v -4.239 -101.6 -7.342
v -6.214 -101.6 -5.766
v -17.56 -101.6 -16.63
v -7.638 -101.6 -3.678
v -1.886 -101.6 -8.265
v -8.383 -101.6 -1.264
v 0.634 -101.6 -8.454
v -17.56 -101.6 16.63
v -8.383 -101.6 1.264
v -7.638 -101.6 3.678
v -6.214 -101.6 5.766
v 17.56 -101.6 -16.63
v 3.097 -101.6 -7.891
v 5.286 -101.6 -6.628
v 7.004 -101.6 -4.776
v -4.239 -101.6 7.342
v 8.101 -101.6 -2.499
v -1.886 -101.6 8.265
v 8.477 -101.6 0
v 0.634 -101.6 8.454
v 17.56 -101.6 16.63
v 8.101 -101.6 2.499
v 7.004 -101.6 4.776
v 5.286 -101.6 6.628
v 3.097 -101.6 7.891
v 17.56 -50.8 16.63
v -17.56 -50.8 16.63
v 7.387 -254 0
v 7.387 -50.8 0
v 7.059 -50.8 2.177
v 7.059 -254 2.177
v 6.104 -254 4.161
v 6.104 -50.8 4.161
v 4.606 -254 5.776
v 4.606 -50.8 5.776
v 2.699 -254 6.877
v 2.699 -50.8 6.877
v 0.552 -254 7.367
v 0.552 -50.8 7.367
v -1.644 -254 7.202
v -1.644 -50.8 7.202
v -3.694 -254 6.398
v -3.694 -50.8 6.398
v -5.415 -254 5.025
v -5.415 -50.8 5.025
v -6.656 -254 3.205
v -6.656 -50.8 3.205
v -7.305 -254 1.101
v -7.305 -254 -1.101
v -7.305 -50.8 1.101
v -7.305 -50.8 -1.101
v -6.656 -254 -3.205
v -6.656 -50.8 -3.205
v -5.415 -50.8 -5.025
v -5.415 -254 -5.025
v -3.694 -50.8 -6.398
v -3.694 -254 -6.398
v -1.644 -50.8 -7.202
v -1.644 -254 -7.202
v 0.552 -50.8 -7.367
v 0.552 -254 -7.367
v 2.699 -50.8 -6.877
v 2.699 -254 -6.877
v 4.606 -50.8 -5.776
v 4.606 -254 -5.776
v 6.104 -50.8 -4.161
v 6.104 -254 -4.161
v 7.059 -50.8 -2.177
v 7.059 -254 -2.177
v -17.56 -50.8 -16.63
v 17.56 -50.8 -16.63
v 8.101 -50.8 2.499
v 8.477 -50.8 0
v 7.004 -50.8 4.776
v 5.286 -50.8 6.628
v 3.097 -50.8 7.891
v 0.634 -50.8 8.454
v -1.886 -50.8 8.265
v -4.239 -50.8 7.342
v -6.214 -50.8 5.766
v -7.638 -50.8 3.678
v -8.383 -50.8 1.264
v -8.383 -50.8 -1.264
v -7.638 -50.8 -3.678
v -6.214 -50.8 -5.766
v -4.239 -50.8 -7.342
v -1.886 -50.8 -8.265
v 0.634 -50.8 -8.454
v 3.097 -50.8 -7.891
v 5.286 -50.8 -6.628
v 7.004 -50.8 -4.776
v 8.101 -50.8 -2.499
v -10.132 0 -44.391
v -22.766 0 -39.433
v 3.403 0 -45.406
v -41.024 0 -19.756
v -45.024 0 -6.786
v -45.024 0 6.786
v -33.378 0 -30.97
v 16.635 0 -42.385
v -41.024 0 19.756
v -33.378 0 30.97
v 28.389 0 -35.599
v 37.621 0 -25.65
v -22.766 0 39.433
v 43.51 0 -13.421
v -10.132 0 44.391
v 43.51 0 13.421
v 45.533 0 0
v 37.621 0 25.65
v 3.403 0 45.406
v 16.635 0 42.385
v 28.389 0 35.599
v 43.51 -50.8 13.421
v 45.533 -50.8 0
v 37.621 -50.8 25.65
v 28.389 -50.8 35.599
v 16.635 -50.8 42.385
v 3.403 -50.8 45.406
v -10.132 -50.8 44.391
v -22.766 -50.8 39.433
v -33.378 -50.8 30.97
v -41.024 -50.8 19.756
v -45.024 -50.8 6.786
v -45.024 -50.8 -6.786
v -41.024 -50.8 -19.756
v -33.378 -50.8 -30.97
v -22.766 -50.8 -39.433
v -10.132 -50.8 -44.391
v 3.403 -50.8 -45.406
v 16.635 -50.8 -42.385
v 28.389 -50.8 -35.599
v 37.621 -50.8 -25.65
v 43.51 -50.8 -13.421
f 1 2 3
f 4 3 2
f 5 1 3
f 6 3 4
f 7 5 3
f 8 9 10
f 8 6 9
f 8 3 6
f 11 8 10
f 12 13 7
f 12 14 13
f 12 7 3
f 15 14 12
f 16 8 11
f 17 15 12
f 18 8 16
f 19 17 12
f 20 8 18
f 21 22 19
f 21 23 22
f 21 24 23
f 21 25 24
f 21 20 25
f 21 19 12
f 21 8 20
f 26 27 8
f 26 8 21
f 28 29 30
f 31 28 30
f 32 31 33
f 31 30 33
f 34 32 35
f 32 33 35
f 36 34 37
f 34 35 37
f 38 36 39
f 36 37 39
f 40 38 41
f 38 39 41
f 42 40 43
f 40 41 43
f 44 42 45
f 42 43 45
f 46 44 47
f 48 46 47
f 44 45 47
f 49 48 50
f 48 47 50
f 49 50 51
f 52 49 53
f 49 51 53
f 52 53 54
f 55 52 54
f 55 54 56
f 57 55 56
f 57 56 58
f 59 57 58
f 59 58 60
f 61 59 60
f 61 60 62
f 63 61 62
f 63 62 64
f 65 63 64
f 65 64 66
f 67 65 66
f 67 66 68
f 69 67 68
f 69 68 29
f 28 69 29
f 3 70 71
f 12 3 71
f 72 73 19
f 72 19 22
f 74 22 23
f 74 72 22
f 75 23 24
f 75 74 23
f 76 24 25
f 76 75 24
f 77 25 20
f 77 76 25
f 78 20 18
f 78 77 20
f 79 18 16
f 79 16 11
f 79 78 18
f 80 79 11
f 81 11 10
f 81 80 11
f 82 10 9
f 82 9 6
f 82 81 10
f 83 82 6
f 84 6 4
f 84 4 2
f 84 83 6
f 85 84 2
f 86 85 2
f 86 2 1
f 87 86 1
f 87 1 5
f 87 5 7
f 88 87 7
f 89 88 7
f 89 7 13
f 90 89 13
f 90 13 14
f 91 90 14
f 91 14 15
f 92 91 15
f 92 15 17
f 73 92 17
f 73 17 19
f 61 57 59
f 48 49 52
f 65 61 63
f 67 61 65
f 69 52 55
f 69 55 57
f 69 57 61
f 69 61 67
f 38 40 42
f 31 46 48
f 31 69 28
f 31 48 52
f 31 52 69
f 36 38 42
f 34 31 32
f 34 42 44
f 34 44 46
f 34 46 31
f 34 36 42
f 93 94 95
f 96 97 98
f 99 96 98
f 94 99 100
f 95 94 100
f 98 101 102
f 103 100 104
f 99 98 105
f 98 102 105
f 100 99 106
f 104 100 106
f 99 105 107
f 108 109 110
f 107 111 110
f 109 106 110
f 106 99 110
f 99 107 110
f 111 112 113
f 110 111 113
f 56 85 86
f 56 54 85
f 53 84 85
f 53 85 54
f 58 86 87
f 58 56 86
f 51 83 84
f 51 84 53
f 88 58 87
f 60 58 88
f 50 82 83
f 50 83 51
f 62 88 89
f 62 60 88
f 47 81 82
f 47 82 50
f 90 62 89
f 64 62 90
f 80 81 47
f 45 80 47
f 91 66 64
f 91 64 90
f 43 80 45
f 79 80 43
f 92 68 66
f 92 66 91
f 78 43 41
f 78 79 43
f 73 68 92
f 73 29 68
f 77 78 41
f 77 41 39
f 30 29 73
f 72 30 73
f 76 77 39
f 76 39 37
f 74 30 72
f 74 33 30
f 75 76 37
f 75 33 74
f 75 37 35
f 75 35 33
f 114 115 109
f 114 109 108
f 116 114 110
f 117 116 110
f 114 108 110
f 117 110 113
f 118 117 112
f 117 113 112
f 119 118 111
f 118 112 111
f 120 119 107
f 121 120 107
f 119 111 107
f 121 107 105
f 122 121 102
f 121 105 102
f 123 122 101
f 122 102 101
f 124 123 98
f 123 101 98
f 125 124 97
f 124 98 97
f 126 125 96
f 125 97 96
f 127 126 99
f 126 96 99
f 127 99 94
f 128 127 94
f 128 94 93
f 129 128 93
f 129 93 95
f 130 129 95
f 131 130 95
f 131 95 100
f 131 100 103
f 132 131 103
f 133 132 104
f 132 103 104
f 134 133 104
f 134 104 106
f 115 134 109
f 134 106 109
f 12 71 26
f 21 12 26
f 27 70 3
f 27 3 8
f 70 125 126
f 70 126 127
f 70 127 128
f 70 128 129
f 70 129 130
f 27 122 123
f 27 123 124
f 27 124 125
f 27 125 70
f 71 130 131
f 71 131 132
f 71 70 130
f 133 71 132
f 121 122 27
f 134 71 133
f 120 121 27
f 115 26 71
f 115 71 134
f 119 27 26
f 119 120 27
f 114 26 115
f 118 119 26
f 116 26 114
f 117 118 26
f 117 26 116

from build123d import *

# Parameters (mm, degrees)
F0_W     = 35.12067
F0_H     = 33.25997
F0_R     = 8.477478
F1_DEPTH = 101.6
F2_R     = 45.532987
F3_DEPTH = 50.8
F4_R     = 7.387342
F5_DEPTH = 254


with BuildPart() as f1:
    # F0 (on Front) → F1 (new body)
    with BuildSketch(Plane.XZ):
        Rectangle(F0_W, F0_H)
        Circle(F0_R, mode=Mode.SUBTRACT)
    extrude(amount=F1_DEPTH)

    # F2 (on Front) → F3 (join)
    with BuildSketch(Plane.XZ):
        Circle(F2_R)
    extrude(amount=F3_DEPTH)

    # F4 (on Front) → F5 (join)
    with BuildSketch(Plane.XZ):
        Circle(F4_R)
    extrude(amount=F5_DEPTH)


solid = f1.part
